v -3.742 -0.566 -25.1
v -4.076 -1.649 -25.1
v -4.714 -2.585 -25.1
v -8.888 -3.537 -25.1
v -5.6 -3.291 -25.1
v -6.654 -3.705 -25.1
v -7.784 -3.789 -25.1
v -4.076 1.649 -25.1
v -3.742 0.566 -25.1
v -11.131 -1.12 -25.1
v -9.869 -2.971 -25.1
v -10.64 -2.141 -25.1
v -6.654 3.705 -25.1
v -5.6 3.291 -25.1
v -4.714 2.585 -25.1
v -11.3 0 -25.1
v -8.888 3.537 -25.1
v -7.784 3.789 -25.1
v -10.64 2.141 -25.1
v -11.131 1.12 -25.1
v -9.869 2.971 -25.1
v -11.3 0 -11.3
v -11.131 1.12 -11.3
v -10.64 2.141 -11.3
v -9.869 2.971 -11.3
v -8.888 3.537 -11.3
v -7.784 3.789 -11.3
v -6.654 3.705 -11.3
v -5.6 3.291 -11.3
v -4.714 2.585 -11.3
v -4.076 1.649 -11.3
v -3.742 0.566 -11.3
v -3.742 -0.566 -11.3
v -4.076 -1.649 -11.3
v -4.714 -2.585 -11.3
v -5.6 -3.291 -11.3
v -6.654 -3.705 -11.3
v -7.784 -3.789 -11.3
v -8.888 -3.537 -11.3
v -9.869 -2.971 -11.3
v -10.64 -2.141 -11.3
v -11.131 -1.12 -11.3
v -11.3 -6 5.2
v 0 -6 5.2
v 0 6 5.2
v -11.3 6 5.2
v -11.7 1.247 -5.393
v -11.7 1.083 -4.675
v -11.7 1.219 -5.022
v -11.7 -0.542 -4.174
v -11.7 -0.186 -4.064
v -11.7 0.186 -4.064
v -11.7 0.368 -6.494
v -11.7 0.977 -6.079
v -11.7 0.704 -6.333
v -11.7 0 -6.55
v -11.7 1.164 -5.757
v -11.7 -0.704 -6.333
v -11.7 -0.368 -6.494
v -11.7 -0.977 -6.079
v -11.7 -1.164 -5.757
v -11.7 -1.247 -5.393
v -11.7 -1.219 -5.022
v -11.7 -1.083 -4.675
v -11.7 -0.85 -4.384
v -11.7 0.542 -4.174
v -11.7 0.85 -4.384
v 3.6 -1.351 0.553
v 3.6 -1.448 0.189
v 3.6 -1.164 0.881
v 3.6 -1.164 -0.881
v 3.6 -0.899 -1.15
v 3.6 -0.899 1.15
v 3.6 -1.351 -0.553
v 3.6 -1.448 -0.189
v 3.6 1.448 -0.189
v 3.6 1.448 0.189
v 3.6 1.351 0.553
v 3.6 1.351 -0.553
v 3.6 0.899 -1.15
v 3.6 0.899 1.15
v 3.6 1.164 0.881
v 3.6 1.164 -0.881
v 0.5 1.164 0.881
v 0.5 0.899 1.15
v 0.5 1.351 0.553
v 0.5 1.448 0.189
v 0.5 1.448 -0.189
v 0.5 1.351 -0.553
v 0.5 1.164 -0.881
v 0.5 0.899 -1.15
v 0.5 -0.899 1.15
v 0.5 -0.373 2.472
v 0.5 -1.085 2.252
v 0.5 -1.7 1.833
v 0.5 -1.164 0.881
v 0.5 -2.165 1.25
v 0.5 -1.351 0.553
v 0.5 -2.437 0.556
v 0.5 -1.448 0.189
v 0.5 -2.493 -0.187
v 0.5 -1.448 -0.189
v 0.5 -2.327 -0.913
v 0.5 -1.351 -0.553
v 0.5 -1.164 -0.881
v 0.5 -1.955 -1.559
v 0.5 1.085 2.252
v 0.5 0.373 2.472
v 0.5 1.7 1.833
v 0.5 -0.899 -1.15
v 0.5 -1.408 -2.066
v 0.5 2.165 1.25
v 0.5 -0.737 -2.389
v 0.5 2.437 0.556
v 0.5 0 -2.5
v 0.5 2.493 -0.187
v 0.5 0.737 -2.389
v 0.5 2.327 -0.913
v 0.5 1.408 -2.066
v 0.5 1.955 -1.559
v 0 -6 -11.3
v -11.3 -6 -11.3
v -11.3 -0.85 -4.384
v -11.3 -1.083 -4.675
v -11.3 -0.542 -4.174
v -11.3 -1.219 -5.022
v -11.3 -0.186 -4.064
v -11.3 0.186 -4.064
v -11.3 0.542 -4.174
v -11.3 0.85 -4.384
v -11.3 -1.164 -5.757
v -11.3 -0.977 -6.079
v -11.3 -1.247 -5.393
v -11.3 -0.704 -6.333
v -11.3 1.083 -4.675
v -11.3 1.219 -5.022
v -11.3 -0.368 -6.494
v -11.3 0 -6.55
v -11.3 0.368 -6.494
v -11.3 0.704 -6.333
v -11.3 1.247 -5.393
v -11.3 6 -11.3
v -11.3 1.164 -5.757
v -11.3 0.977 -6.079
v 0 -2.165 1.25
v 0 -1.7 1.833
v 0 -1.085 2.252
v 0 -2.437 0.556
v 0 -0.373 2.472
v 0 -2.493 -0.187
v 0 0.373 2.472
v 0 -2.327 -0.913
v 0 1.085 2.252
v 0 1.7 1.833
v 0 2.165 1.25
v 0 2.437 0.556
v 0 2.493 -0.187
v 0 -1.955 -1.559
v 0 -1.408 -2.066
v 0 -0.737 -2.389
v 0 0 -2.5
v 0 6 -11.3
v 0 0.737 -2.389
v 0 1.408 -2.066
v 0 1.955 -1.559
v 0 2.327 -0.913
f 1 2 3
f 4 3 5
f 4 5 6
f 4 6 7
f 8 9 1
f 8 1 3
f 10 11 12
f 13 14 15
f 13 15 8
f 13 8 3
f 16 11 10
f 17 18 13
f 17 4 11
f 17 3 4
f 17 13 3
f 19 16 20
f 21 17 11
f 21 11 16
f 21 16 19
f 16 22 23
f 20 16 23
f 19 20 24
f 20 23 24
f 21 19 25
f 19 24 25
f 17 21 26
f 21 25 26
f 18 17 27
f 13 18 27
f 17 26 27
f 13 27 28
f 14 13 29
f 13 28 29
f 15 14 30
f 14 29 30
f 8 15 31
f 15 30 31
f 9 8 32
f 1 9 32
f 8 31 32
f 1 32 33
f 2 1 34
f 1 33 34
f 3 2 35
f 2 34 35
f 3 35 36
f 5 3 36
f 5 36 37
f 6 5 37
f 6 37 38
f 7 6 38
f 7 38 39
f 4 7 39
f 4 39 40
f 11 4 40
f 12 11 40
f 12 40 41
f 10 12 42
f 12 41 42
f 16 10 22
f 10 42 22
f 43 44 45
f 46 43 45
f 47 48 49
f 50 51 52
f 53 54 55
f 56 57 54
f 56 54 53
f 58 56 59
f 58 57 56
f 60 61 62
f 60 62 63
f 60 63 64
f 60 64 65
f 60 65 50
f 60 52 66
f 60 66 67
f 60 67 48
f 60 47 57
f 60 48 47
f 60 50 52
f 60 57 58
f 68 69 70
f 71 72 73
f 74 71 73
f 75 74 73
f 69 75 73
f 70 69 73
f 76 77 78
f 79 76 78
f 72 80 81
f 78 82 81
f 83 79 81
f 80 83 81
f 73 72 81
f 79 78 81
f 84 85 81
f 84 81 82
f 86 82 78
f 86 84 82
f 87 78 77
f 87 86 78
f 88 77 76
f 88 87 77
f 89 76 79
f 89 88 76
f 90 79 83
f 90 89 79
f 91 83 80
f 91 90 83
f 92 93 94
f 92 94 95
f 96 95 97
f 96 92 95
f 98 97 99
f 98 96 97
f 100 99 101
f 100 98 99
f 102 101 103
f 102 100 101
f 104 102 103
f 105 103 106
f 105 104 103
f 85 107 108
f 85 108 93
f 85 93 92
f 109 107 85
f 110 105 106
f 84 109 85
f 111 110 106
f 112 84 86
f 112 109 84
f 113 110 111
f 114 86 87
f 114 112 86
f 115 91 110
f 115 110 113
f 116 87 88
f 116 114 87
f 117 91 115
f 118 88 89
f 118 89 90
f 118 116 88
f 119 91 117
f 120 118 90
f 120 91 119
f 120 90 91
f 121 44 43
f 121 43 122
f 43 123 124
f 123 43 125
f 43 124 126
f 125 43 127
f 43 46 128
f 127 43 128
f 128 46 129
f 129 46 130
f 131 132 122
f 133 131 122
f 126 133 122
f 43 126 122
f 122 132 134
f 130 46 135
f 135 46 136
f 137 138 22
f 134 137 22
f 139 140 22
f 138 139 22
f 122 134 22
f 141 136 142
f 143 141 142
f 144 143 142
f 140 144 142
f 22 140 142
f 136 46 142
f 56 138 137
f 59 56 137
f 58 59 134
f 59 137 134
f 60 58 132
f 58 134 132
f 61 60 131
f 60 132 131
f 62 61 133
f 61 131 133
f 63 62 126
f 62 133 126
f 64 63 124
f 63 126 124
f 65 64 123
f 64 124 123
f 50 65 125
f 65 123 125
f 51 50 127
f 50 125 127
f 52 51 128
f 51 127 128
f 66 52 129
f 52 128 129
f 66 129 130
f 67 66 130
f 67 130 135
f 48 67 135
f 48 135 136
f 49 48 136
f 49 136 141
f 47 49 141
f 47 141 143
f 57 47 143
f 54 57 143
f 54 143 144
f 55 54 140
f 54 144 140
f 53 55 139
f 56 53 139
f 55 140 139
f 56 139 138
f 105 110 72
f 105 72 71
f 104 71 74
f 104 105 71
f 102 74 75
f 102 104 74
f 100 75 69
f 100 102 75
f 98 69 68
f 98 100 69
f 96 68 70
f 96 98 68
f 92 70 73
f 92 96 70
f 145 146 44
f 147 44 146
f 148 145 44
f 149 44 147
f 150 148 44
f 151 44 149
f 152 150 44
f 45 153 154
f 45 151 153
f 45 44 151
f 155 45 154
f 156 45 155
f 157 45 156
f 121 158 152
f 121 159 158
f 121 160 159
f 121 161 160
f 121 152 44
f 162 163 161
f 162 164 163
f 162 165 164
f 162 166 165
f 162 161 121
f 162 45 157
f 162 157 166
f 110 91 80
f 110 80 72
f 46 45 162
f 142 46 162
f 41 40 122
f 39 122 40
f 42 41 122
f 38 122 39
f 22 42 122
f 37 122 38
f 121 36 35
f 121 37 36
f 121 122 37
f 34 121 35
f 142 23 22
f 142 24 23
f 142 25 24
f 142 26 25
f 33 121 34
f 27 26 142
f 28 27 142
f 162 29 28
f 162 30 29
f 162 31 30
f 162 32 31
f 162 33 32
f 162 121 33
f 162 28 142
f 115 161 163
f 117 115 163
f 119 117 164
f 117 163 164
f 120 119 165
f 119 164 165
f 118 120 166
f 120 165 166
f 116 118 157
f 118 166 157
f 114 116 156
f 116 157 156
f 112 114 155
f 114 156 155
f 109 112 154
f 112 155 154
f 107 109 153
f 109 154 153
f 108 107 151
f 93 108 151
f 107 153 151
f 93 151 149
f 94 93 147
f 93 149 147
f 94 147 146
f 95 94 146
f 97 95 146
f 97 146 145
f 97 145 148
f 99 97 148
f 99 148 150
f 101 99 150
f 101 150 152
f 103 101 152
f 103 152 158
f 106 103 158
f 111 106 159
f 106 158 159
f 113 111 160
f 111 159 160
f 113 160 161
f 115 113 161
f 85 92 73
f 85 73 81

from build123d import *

# Parameters (mm, degrees)
SKETCH1_W             = 16.5
SKETCH1_H             = 12
BASE_DEPTH            = 11.3
SKETCH2_R             = 2.5
AXLE_BASE_DEPTH       = 0.5
AXLE_DEPTH            = 3.1
SKETCH4_R             = 3.8
WIRE_HOUSING_DEPTH    = 13.8
SKETCH5_R             = 1.25
RANDOM_ASS_BUMP_DEPTH = 0.4


with BuildPart() as part:
    # Sketch1 → Base (new body)
    with BuildSketch(Plane(origin=(0, 0, 0), x_dir=(0, 0, -1), z_dir=(1, 0, 0))):
        with Locations((3.05, 0)):
            Rectangle(SKETCH1_W, SKETCH1_H)
    extrude(amount=-BASE_DEPTH)

    # Sketch2 → Axle Base (add)
    with BuildSketch(Plane(origin=(0, 0, 0), x_dir=(0, 0, -1), z_dir=(1, 0, 0))):
        Circle(SKETCH2_R)
    extrude(amount=AXLE_BASE_DEPTH)

    # Sketch3 → Axle (add)
    with BuildSketch(Plane(origin=(0.5, 0, 0), x_dir=(0, 0, -1), z_dir=(1, 0, 0))):
        with BuildLine():
            Line((1.15, 0.899499861), (1.15, -0.899499861))
            ThreePointArc((1.15, -0.899499861), (0, -1.46), (-1.15, -0.899499861))
            Line((-1.15, -0.899499861), (-1.15, 0.899499861))
            ThreePointArc((-1.15, 0.899499861), (0, 1.46), (1.15, 0.899499861))
        make_face()
    extrude(amount=AXLE_DEPTH)

    # Sketch4 → Wire Housing (add)
    with BuildSketch(Plane(origin=(0, 0, -11.3), x_dir=(-1, 0, 0), z_dir=(0, 0, -1))):
        with Locations((7.5, 0)):
            Circle(SKETCH4_R)
    extrude(amount=WIRE_HOUSING_DEPTH)

    # Sketch5 → Random-ass Bump (add)
    with BuildSketch(Plane.ZY.offset(11.3)):
        with Locations(Location((-5.3, 0, 0), (0, 0, 180))):
            Circle(SKETCH5_R)
    extrude(amount=RANDOM_ASS_BUMP_DEPTH)


solid = part.part
